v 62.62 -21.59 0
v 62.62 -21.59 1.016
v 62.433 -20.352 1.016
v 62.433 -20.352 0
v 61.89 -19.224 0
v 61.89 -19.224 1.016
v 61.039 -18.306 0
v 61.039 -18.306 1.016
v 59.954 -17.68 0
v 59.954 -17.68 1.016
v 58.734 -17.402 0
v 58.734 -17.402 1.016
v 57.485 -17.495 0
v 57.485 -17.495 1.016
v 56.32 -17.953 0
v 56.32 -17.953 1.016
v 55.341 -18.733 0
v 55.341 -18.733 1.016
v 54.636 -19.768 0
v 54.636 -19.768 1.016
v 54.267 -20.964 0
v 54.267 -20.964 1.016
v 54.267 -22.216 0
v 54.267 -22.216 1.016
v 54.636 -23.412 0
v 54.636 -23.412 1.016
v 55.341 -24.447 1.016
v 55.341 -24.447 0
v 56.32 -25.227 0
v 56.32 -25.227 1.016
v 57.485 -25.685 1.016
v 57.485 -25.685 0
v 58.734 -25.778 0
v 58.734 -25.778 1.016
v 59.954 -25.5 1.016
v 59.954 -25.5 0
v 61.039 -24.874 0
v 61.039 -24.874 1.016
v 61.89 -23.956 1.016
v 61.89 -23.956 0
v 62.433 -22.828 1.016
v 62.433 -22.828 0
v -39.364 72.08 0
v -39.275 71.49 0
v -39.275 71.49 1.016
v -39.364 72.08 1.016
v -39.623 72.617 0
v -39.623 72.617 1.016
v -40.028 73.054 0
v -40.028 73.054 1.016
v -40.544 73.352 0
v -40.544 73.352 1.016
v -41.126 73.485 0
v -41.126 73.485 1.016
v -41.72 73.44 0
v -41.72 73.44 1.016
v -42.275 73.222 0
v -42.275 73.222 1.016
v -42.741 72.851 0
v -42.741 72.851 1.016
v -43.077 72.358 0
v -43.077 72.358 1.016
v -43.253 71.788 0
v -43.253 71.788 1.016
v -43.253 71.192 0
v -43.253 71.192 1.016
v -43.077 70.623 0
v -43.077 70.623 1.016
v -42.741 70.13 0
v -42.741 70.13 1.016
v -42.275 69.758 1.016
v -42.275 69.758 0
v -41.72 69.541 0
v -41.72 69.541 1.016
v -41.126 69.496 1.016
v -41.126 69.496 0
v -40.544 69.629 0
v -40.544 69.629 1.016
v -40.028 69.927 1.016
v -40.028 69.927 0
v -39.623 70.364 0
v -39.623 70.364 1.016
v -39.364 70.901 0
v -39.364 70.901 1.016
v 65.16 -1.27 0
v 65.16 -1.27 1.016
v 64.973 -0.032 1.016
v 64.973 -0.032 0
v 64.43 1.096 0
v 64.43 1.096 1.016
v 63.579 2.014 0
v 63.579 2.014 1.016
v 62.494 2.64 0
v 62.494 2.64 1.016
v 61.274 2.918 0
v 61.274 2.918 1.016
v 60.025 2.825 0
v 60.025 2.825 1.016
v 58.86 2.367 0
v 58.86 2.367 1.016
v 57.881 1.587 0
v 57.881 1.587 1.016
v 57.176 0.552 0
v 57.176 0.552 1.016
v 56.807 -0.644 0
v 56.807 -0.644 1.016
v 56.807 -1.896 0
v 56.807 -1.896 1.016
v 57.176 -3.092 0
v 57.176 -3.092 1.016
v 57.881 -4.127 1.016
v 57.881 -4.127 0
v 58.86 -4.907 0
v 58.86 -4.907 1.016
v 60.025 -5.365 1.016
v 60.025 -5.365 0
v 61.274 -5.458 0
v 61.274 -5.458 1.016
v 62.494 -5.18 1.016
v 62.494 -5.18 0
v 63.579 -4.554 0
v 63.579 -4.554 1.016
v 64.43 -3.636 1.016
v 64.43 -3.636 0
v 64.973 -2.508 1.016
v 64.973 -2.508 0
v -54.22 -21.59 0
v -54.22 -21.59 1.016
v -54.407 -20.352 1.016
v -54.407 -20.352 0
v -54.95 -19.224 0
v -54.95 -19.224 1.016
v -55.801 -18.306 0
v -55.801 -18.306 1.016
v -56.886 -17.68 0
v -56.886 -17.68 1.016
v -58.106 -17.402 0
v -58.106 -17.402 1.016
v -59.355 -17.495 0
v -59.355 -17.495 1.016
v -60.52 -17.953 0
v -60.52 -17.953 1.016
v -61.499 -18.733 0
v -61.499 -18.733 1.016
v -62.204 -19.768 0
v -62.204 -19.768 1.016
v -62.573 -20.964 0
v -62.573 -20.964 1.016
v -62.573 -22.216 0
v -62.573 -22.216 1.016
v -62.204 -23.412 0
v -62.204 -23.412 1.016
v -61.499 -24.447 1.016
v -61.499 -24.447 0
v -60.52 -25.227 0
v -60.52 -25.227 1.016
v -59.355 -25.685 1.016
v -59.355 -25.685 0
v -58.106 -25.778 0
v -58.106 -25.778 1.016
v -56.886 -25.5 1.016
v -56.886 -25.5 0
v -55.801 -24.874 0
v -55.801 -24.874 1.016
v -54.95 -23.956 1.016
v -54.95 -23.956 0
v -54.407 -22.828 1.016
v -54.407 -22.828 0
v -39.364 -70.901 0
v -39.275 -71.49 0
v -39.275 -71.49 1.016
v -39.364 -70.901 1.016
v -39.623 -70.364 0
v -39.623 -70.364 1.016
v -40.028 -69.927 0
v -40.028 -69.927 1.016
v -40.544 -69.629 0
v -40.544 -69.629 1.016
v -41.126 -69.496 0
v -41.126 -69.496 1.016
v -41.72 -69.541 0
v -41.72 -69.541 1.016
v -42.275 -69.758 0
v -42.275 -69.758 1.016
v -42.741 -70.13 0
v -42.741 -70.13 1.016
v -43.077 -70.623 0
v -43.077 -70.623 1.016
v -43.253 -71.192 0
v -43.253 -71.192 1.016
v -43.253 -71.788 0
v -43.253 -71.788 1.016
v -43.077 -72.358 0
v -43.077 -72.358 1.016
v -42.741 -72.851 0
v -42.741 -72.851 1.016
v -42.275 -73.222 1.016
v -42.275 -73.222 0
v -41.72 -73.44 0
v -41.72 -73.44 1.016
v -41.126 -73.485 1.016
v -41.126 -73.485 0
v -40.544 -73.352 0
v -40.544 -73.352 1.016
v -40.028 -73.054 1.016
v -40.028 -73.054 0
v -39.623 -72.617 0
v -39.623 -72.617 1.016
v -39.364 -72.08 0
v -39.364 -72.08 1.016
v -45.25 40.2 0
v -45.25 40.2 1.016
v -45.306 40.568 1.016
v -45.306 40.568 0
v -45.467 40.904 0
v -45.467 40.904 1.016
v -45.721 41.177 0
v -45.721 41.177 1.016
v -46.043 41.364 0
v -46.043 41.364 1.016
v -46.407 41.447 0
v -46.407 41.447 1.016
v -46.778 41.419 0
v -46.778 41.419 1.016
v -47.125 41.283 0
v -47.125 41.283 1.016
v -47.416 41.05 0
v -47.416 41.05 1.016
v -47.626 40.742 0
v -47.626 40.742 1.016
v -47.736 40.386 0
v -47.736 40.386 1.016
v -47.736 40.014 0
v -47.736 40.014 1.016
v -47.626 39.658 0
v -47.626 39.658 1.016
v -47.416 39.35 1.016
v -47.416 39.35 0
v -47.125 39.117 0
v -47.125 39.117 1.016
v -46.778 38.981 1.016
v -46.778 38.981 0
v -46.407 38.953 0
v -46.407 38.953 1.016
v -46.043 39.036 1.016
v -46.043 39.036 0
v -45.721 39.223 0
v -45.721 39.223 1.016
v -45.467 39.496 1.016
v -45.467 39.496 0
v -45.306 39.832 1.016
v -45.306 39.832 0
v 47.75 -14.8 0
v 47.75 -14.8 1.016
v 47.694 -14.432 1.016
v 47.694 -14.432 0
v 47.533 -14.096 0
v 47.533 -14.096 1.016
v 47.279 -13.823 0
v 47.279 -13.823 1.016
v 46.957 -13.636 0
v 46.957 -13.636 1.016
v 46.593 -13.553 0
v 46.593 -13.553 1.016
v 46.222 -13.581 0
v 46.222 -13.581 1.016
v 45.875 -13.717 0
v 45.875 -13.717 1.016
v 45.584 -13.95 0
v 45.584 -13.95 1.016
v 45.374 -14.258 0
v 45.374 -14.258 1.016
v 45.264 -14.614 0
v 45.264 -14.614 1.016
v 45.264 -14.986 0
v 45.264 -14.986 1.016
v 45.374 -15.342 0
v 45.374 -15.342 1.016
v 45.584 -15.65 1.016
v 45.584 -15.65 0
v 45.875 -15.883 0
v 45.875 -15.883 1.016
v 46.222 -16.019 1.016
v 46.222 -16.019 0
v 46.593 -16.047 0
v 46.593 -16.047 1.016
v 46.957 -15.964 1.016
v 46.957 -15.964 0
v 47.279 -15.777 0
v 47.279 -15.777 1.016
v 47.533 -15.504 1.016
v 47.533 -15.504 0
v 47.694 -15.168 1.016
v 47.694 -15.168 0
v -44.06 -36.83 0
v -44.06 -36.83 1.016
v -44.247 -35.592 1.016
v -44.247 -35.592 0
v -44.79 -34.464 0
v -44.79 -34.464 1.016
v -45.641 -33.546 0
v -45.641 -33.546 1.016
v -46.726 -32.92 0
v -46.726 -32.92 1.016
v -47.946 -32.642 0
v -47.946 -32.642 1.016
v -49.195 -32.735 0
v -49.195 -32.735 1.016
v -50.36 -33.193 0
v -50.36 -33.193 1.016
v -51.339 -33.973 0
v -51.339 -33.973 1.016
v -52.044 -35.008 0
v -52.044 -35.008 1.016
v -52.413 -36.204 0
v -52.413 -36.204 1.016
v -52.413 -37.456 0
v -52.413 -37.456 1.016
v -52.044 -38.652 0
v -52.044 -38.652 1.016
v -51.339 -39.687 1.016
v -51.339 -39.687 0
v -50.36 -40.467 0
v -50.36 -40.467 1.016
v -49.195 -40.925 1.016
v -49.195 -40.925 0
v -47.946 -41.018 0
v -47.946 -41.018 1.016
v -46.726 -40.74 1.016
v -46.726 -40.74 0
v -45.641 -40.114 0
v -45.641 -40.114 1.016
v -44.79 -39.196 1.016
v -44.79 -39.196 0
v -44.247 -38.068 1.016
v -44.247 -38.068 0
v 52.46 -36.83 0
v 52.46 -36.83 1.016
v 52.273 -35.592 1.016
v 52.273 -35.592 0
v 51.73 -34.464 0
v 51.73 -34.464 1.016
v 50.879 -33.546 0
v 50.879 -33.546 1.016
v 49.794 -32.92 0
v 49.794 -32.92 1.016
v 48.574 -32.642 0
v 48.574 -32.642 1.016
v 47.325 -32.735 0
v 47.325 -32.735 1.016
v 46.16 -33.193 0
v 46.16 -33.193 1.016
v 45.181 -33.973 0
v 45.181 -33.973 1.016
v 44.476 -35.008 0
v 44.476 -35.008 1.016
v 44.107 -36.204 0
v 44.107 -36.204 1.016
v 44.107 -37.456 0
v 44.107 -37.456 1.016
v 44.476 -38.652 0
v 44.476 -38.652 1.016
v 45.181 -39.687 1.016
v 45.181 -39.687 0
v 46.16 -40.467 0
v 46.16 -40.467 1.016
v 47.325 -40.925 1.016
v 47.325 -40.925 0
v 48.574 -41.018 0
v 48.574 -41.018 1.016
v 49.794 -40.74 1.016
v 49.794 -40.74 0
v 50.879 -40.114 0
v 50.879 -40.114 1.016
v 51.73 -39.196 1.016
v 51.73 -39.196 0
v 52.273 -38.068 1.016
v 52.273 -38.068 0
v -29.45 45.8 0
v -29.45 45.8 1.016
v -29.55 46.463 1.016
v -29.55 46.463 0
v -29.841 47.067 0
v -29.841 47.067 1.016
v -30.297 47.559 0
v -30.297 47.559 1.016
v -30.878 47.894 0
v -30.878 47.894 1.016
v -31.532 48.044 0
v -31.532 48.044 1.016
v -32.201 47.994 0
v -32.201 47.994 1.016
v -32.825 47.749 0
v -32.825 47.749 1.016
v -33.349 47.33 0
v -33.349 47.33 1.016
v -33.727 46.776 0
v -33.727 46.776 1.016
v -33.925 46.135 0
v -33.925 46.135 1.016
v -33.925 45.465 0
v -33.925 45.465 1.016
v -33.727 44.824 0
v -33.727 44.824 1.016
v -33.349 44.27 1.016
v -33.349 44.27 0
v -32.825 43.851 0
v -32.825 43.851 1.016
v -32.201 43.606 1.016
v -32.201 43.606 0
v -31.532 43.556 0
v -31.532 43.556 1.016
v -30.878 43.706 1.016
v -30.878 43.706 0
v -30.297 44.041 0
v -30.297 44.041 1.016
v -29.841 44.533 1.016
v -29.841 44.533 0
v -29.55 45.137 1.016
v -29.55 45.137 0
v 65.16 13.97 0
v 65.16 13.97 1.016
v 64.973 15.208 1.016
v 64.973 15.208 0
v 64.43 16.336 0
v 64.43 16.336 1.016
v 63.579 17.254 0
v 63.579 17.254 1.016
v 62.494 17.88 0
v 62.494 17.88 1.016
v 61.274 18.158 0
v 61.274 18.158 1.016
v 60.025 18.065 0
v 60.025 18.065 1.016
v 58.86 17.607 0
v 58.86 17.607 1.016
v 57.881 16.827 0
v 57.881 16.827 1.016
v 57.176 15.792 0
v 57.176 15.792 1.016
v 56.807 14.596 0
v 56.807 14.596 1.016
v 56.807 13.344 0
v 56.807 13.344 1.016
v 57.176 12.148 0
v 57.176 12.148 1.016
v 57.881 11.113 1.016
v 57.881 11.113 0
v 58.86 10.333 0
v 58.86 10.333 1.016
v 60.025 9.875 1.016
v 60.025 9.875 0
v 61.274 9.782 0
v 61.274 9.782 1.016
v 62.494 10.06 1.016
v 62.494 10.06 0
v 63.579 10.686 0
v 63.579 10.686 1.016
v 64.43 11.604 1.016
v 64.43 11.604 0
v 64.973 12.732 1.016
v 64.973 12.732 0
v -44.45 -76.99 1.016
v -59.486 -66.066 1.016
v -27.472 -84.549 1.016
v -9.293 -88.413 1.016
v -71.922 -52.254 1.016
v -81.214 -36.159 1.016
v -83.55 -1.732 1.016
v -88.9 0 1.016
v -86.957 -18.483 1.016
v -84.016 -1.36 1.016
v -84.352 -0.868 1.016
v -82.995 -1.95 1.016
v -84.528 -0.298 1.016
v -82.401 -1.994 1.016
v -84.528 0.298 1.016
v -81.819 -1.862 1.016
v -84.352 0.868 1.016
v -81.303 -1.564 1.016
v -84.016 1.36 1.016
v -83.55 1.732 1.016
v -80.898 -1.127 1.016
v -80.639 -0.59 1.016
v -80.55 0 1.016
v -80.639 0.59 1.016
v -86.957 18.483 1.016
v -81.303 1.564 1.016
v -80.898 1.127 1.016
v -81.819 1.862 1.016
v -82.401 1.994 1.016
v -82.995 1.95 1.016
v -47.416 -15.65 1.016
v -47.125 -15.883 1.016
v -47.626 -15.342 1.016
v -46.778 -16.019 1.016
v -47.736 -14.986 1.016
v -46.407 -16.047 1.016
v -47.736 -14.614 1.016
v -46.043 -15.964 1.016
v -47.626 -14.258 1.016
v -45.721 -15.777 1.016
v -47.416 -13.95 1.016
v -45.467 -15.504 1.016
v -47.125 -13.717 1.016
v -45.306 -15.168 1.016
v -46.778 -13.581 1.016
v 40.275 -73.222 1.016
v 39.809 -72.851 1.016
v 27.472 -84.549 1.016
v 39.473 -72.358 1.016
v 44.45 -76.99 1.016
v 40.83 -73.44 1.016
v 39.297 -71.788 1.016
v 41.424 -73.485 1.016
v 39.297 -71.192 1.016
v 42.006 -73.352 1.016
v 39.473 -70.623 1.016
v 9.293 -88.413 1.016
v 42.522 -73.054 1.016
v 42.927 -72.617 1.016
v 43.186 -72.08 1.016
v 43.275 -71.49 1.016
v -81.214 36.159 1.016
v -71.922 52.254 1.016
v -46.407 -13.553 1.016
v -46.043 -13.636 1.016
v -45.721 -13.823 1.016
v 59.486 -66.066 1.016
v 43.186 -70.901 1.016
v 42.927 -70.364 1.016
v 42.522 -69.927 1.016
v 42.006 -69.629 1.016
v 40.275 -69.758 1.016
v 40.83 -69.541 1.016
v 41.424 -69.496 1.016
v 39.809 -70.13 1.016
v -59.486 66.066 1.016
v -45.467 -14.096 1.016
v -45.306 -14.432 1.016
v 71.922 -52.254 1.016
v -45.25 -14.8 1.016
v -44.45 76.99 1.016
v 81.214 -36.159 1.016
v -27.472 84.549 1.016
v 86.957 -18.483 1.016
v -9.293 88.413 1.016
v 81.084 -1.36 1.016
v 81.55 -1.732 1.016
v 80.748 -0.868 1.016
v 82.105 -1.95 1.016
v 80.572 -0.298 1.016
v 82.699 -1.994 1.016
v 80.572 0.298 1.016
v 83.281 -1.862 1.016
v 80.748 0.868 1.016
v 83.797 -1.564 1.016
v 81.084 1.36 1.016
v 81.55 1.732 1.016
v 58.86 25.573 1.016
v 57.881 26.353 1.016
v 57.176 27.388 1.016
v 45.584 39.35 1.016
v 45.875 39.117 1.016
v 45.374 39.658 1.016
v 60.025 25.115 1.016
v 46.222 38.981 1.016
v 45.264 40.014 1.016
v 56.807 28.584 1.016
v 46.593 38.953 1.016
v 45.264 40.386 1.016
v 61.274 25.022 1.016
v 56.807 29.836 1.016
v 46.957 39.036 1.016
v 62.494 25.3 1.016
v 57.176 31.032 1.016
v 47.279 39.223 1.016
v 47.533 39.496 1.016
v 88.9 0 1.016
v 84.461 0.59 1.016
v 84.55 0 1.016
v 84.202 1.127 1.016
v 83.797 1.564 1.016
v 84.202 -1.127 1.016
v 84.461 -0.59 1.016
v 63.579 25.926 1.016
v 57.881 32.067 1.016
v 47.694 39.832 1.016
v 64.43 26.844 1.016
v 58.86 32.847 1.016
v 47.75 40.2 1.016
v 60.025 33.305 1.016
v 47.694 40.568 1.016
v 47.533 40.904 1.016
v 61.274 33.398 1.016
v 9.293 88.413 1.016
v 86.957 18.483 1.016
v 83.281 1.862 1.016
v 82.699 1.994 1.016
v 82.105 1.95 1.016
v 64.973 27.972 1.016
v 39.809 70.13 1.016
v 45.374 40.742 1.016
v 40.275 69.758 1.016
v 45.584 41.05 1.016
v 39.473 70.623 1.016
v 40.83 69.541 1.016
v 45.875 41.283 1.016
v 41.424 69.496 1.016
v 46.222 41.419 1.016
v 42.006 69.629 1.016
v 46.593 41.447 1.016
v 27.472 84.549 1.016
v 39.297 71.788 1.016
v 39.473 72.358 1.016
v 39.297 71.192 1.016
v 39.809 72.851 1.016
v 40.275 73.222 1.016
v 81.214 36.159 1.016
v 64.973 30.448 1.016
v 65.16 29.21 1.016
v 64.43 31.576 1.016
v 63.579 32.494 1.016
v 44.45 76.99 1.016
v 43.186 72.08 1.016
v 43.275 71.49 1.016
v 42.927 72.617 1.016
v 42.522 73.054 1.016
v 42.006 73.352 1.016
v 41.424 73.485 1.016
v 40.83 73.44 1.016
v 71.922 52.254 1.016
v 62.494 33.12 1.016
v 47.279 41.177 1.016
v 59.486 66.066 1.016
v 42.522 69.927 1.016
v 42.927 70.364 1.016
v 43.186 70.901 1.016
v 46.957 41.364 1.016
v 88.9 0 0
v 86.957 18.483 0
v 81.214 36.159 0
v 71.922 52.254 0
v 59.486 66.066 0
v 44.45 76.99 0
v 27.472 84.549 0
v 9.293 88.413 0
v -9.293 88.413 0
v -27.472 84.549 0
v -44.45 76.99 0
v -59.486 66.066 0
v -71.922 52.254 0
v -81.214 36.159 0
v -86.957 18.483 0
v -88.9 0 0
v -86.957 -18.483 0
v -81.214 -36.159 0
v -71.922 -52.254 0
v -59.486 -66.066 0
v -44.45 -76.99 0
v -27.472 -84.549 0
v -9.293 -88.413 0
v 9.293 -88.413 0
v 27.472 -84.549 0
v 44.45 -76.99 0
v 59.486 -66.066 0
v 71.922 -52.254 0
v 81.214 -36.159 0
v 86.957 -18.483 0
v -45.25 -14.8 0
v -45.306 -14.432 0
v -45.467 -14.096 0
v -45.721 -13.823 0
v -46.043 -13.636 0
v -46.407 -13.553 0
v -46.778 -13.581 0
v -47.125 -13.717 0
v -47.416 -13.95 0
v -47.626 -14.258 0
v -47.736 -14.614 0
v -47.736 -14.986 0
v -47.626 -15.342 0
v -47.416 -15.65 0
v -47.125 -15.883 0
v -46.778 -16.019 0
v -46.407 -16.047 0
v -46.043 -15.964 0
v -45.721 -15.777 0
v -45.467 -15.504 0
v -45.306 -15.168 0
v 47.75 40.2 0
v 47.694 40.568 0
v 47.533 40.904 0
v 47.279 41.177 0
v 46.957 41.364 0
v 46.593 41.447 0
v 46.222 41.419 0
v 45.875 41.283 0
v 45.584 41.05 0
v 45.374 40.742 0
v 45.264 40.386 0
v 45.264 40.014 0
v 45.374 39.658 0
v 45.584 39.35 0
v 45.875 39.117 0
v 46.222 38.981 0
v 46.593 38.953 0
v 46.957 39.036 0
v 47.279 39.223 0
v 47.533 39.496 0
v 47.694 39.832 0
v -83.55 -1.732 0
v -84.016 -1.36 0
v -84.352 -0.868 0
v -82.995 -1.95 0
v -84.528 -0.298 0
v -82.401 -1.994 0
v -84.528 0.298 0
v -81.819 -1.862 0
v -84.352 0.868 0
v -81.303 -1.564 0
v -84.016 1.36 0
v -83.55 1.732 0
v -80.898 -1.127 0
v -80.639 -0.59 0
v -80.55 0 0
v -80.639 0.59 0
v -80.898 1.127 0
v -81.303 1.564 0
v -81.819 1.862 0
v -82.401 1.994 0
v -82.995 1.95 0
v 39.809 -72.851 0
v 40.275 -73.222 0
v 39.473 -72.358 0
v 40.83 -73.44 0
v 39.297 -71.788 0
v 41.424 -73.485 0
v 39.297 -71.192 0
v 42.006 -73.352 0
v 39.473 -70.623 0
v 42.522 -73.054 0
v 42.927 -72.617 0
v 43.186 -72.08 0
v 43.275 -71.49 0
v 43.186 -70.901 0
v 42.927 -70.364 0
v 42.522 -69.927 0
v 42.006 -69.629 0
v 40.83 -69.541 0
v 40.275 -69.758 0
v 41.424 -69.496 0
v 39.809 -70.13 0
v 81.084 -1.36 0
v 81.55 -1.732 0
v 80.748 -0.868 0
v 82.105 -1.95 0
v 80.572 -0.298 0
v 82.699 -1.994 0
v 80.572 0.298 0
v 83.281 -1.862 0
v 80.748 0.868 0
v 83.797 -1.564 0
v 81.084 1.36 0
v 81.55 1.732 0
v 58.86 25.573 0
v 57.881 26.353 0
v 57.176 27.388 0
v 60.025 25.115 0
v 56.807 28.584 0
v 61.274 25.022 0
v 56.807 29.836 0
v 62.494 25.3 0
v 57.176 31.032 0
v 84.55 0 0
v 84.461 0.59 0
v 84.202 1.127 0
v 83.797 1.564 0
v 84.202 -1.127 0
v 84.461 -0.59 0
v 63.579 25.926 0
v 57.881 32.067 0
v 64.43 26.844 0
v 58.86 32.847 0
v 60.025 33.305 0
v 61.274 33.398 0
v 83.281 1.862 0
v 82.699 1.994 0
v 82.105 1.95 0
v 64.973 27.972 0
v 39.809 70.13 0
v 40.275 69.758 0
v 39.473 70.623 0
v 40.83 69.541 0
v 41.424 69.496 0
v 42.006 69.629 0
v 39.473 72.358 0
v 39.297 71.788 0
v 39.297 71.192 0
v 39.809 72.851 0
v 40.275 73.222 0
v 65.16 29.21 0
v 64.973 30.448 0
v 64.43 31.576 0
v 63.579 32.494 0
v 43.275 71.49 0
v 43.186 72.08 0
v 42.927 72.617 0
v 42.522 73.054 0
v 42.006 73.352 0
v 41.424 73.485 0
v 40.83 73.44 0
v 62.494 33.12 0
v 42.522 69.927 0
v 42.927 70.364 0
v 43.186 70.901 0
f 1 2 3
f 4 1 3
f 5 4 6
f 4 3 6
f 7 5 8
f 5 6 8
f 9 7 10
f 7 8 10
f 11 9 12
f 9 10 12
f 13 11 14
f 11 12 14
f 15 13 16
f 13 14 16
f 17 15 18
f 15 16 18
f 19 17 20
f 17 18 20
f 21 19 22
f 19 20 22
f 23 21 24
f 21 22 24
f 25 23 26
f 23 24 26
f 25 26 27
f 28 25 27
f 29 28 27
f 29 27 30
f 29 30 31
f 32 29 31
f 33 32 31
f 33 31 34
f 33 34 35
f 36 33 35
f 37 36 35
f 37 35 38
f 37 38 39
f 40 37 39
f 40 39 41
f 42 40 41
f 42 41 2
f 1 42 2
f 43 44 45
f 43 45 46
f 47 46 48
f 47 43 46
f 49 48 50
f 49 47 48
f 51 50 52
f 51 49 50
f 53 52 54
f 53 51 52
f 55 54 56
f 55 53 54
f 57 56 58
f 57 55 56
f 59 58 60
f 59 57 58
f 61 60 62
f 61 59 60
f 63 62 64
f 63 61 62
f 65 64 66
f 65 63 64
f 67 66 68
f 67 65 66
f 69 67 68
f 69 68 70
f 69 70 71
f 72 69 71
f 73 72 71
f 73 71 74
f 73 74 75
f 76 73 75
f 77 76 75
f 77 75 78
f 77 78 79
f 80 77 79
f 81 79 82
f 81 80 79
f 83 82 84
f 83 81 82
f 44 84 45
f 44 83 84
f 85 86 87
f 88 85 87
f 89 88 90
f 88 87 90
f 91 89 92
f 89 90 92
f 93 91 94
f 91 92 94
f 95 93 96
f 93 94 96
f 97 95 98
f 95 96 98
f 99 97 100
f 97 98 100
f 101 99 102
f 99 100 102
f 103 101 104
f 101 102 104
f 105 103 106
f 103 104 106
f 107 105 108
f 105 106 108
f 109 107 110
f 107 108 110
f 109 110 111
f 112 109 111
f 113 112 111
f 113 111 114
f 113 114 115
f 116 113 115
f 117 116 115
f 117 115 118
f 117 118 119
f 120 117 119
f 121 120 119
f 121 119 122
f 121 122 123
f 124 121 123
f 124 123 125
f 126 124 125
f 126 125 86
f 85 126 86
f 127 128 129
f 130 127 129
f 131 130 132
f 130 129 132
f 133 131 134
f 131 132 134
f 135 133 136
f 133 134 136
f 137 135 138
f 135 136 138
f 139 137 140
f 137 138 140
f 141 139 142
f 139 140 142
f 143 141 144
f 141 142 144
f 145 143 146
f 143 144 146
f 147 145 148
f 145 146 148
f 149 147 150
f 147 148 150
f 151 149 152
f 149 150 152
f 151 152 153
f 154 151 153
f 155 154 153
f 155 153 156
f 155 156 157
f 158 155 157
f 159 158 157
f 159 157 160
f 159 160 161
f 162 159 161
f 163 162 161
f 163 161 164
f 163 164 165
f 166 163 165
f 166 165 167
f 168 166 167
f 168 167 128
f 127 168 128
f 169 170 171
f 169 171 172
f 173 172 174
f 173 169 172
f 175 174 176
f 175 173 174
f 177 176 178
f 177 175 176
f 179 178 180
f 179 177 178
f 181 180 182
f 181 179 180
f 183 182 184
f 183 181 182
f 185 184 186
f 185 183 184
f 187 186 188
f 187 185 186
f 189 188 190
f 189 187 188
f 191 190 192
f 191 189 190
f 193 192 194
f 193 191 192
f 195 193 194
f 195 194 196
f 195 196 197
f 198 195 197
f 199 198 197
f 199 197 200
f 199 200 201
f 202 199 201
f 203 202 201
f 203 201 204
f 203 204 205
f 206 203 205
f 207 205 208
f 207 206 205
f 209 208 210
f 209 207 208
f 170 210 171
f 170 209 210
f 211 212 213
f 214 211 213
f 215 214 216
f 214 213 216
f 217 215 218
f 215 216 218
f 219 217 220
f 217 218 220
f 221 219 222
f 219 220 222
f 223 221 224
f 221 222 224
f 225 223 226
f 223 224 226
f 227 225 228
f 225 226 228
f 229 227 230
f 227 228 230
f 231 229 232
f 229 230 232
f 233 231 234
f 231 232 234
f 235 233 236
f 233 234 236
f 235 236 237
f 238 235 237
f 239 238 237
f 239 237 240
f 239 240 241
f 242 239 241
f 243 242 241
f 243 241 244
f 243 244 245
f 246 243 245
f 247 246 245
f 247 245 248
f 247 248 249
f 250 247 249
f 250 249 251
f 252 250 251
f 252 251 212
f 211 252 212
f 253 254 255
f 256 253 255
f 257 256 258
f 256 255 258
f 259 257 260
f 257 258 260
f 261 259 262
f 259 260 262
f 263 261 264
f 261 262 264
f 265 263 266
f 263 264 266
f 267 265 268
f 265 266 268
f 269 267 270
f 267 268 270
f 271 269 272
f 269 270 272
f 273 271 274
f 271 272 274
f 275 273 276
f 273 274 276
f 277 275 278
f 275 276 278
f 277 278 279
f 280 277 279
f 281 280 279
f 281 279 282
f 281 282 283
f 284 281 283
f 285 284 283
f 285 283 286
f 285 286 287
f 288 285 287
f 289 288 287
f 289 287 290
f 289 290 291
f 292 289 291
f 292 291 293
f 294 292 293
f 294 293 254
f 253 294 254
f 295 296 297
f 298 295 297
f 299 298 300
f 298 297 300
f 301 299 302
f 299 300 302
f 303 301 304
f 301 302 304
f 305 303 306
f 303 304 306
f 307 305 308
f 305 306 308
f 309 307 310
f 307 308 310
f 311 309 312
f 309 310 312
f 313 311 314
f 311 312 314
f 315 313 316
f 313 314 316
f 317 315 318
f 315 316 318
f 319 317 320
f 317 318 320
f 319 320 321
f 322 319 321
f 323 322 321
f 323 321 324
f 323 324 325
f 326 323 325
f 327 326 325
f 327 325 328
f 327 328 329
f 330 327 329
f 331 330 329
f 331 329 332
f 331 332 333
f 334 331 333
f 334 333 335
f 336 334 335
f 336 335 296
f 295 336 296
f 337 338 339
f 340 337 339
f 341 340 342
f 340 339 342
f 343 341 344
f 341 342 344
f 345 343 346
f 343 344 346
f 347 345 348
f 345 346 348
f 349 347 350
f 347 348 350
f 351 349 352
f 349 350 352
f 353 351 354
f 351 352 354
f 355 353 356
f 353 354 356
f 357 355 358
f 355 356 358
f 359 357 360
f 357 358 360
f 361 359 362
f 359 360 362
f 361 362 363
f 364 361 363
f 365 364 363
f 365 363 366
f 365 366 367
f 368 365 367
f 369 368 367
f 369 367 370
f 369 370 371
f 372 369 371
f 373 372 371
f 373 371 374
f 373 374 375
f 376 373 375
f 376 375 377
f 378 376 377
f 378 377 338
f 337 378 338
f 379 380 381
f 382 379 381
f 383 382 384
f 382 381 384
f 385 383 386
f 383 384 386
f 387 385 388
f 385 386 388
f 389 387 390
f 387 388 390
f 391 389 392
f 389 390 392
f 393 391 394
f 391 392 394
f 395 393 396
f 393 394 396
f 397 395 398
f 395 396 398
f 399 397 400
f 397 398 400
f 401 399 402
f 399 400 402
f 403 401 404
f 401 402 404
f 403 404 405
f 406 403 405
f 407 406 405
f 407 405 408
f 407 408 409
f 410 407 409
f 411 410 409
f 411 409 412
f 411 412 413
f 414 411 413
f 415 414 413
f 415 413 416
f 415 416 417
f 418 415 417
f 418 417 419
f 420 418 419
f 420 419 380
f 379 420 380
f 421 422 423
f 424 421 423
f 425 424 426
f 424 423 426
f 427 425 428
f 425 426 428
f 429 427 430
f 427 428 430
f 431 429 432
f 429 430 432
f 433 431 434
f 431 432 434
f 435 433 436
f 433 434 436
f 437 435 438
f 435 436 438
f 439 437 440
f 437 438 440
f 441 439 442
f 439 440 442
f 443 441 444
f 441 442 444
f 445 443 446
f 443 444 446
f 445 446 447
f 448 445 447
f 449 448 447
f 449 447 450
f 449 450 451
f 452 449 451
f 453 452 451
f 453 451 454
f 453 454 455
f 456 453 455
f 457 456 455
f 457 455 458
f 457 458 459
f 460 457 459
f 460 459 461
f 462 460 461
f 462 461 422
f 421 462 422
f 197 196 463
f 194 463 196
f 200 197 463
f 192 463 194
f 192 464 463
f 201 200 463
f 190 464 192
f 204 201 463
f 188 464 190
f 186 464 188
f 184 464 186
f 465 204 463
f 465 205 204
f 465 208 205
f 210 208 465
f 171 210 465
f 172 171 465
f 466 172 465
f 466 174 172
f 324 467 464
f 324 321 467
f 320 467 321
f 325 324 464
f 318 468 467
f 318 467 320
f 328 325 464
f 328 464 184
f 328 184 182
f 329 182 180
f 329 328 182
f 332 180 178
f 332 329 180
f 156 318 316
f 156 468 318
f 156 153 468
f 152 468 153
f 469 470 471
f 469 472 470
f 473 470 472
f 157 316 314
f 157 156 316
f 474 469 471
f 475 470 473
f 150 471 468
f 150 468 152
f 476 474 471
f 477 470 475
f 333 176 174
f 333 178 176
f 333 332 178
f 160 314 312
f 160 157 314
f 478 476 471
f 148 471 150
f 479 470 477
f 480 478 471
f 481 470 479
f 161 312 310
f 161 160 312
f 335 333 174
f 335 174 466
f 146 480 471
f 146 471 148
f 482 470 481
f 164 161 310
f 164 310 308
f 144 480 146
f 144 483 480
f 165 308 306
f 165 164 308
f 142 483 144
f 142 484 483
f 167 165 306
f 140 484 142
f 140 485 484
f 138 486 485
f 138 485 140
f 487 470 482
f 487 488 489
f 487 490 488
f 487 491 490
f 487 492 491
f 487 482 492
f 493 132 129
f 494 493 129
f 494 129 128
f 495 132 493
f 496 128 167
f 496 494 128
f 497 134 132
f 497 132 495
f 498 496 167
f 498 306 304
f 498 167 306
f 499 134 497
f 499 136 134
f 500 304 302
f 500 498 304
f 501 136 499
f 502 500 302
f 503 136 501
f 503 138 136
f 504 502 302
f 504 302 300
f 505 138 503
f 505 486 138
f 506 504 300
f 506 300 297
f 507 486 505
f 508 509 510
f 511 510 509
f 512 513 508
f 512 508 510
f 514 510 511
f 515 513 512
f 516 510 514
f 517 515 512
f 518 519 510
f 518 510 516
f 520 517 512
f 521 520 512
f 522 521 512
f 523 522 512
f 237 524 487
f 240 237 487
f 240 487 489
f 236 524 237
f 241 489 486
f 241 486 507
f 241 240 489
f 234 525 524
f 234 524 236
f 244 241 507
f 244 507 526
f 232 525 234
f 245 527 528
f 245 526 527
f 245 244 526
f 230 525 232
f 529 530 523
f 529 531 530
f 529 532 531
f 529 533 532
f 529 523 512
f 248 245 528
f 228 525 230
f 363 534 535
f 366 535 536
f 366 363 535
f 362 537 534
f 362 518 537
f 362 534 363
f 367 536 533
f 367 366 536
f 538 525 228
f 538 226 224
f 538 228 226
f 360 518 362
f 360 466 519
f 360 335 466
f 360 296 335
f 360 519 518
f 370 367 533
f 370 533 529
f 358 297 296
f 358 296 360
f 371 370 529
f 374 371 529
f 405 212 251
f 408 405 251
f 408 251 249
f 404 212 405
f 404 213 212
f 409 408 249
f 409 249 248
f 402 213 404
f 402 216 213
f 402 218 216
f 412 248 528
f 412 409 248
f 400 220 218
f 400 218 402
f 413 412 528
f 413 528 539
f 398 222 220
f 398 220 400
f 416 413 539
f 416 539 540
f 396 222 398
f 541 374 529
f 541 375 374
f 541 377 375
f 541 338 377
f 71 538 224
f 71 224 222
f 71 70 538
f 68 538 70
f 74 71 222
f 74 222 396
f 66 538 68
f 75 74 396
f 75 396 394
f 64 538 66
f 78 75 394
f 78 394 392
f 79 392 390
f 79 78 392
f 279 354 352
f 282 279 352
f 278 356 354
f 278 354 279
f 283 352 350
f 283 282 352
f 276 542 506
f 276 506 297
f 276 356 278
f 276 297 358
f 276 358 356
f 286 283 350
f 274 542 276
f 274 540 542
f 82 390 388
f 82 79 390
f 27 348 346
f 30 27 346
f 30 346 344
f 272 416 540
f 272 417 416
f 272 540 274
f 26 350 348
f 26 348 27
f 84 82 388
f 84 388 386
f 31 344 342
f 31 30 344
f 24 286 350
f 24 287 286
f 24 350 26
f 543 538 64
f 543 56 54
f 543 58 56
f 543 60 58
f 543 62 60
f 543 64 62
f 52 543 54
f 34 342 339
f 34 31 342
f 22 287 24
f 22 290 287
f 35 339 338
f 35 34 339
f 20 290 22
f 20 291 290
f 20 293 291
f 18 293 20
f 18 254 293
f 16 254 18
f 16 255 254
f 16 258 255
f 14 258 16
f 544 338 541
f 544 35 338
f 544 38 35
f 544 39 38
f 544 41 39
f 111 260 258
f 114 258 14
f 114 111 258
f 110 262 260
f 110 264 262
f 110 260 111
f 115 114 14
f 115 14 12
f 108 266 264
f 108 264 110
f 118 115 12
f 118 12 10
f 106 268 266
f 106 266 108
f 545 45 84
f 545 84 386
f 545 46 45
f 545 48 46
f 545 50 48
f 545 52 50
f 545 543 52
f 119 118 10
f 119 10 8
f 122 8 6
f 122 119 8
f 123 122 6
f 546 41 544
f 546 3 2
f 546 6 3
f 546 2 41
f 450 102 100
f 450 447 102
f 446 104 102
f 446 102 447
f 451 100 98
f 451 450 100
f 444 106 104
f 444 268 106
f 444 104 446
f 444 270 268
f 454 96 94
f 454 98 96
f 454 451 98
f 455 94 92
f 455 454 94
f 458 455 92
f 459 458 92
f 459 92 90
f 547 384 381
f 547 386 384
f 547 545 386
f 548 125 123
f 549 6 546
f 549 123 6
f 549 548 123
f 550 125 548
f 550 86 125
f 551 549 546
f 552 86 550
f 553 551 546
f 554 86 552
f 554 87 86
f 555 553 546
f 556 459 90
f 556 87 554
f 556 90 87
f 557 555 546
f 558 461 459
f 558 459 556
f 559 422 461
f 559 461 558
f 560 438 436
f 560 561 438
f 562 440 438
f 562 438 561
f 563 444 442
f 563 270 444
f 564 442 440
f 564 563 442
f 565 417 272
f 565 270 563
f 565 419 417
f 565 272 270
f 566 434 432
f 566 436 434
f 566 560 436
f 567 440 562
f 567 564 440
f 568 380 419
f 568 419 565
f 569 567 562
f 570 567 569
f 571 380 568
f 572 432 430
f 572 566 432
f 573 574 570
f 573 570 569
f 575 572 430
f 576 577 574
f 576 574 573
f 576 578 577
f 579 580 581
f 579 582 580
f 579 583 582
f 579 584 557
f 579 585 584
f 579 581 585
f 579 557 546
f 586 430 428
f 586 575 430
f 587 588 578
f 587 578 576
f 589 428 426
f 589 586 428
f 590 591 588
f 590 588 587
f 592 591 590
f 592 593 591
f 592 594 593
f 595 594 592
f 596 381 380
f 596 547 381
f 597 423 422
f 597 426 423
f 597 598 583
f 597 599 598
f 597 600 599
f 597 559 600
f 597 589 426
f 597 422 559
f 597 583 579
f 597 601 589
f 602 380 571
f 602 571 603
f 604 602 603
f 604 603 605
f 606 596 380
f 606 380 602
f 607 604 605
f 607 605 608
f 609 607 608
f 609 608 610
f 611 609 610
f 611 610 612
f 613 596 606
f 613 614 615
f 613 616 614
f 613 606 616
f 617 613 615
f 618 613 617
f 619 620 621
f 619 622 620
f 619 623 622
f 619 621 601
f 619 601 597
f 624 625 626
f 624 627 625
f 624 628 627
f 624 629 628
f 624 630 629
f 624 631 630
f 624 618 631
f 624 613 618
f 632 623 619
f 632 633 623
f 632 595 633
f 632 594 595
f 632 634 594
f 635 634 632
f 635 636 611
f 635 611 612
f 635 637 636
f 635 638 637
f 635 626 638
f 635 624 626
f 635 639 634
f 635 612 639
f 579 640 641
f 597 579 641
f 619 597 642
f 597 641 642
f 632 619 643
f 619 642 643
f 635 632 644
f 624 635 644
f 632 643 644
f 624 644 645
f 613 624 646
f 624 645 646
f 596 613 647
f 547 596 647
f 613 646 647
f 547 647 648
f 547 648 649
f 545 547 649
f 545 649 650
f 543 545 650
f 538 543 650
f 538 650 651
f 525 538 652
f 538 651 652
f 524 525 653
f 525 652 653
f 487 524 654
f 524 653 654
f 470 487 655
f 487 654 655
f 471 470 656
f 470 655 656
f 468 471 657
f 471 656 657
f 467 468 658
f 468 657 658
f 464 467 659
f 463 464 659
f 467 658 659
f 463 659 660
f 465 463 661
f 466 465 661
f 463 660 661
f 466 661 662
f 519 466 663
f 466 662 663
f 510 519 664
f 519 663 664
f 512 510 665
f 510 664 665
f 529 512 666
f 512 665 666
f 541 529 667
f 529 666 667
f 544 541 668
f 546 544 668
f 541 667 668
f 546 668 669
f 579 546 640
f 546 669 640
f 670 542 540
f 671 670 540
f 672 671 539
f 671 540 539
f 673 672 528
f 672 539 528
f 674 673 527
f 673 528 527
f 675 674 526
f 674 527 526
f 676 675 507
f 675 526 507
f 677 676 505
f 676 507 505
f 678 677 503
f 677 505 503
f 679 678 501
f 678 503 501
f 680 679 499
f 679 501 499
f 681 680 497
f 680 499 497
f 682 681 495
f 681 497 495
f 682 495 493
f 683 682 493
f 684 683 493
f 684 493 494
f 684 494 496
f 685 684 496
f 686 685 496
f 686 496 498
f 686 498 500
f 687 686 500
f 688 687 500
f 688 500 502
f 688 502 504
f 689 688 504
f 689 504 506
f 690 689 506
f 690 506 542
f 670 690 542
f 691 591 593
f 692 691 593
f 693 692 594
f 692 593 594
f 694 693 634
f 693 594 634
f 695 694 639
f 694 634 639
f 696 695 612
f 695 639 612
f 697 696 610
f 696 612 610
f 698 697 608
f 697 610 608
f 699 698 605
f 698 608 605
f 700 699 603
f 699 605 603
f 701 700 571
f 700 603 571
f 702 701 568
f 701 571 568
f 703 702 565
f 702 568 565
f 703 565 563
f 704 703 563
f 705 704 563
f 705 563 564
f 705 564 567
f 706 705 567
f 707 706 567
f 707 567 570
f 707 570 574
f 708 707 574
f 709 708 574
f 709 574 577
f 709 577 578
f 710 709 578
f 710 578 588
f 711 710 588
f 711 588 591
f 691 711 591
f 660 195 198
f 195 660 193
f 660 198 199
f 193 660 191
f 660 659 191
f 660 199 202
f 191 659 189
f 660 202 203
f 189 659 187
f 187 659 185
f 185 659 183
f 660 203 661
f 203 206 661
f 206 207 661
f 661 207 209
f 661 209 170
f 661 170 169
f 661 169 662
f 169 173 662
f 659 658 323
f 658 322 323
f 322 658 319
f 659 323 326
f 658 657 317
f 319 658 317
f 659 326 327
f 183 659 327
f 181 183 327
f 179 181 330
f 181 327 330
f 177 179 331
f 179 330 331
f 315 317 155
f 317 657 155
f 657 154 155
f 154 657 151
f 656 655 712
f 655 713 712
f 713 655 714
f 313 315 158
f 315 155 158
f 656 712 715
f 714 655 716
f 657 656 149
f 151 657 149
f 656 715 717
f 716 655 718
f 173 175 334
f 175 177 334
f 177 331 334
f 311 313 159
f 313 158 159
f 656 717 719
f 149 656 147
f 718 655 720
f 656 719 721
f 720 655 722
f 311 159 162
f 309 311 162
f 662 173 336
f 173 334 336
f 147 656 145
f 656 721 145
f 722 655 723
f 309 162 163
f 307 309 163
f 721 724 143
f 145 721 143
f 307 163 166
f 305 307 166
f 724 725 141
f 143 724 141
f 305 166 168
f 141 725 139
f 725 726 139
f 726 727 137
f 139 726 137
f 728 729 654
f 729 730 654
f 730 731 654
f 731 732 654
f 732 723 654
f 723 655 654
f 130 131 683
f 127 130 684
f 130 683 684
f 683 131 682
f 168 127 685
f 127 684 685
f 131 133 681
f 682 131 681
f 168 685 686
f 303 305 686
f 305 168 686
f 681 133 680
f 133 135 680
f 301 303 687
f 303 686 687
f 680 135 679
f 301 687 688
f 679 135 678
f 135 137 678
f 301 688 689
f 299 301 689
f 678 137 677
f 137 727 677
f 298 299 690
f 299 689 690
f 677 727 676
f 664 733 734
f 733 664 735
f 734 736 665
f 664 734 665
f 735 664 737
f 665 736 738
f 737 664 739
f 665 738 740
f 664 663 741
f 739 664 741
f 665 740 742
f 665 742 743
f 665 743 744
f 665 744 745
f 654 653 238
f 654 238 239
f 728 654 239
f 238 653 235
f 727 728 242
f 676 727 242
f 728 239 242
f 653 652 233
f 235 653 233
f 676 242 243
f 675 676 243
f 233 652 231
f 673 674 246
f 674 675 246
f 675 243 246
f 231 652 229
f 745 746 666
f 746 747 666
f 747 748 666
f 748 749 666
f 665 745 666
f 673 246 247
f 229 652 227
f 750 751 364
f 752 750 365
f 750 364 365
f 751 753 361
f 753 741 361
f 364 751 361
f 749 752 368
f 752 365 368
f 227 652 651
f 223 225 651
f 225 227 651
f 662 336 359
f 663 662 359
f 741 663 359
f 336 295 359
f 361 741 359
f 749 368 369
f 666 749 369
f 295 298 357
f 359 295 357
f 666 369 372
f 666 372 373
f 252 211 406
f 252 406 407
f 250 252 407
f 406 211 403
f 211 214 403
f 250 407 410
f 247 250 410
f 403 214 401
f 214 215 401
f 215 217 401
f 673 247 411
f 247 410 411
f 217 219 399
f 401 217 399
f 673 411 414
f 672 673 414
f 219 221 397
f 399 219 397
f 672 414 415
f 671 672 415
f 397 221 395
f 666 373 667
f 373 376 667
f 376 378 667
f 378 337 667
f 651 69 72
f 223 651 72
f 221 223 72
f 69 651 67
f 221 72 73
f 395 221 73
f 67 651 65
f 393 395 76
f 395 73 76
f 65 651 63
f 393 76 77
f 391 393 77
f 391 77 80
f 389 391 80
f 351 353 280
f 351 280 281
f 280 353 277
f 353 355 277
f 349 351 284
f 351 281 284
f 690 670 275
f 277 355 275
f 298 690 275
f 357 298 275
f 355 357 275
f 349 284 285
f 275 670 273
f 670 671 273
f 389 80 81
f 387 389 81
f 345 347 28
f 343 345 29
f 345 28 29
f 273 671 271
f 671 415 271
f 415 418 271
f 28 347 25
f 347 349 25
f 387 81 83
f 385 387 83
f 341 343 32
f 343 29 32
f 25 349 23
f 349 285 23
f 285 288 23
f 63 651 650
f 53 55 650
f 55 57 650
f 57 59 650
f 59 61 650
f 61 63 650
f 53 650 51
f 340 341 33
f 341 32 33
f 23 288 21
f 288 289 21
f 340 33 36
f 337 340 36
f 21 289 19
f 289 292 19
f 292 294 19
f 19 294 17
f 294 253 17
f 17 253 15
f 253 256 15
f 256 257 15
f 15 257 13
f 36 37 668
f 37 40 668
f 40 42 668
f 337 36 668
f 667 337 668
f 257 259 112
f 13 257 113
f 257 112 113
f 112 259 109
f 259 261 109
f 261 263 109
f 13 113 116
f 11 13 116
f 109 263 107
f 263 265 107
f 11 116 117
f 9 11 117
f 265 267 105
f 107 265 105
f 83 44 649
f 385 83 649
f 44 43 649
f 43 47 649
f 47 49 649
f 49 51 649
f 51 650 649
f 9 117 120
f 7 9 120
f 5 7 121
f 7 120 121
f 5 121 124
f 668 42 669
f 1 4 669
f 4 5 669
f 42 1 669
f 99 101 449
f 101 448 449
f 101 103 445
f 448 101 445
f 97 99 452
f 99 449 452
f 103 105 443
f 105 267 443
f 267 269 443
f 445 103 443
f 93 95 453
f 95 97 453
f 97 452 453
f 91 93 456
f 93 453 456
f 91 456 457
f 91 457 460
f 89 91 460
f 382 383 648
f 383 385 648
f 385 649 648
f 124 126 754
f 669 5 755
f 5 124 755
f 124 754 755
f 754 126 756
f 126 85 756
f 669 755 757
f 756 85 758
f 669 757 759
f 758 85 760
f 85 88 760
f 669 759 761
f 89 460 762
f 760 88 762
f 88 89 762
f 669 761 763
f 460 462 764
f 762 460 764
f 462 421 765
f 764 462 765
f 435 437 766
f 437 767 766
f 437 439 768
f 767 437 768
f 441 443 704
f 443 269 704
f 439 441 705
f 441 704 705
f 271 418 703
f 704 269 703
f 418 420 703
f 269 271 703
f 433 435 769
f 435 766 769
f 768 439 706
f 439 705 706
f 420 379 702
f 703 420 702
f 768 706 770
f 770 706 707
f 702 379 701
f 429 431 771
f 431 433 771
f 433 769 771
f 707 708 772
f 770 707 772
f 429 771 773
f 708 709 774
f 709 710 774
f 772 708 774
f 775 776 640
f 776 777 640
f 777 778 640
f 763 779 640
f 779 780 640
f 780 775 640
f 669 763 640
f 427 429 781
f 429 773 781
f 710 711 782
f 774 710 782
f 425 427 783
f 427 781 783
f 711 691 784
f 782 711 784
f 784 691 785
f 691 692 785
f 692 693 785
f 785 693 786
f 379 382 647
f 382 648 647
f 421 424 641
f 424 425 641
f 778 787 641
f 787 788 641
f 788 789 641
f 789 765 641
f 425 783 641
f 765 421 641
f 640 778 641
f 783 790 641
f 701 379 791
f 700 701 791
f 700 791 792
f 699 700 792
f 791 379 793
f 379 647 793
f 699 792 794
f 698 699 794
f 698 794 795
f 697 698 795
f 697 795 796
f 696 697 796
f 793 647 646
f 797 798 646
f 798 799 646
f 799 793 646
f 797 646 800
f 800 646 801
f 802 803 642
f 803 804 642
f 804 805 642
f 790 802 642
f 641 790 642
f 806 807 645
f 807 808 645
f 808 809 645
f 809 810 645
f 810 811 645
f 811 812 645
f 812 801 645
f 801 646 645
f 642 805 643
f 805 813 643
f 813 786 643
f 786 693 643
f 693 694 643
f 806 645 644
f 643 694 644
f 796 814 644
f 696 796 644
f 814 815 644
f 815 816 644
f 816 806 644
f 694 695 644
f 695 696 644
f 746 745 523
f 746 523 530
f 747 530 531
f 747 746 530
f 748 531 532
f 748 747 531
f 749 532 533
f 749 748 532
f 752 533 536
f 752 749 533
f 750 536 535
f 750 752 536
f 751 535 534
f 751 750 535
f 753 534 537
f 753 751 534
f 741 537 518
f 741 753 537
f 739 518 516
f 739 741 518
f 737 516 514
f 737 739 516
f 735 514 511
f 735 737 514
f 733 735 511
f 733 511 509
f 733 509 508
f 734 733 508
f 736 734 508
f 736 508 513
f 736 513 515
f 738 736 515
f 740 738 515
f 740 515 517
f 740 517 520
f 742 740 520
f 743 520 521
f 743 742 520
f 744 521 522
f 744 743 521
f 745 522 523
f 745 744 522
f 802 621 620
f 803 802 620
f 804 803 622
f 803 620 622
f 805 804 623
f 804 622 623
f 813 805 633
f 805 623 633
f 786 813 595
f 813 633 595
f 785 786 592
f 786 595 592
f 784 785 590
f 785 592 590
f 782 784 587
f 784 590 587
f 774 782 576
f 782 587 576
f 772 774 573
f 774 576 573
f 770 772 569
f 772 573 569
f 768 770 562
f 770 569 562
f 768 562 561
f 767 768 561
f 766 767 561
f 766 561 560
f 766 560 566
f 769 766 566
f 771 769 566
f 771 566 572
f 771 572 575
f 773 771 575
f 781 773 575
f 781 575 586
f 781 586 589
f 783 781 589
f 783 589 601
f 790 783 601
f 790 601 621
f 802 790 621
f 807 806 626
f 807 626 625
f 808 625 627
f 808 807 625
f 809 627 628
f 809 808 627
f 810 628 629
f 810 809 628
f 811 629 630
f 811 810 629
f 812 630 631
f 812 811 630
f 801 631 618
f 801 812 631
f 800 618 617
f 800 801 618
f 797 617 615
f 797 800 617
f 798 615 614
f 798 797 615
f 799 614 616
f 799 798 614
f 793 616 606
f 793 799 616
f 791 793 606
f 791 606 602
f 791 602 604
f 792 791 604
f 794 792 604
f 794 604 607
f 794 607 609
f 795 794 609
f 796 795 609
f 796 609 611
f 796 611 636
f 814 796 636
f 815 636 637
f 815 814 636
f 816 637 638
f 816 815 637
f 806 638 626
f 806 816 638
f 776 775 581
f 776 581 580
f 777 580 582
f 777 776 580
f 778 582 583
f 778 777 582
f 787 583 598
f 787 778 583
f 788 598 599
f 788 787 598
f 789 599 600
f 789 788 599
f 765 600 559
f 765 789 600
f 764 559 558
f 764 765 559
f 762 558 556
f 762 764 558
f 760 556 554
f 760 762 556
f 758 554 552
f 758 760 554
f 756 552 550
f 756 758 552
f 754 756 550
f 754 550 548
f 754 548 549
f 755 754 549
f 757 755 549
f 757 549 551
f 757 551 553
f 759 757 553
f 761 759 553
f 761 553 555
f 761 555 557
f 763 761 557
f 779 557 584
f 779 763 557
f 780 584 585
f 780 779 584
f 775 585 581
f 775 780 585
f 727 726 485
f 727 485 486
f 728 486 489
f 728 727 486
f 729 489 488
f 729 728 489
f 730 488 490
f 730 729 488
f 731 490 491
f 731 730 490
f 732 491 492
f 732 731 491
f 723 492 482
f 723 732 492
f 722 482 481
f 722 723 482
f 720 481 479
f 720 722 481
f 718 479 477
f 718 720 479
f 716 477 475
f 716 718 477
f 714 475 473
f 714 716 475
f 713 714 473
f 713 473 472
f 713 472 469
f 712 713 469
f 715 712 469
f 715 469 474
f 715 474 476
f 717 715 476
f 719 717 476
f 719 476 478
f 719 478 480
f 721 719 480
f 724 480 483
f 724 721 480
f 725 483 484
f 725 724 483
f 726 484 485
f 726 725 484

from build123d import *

# Parameters (mm, degrees)
SKETCH1_R           = 88.9
SKETCH1_R_2         = 2
BOSS_EXTRUDE1_DEPTH = 1.016
SKETCH3_R           = 1.25
SKETCH3_R_2         = 2.25
CUT_EXTRUDE2_DEPTH  = 3.175
SKETCH4_R           = 4.2
CUT_EXTRUDE3_DEPTH  = 10


with BuildPart() as part:
    # Sketch1 → Boss-Extrude1 (new body)
    with BuildSketch(Plane.XY):
        Circle(SKETCH1_R)
        with Locations((41.275, 71.490397082)):
            Circle(SKETCH1_R_2, mode=Mode.SUBTRACT)
        with Locations((82.55, 0)):
            Circle(SKETCH1_R_2, mode=Mode.SUBTRACT)
        with Locations((41.275, -71.490397082)):
            Circle(SKETCH1_R_2, mode=Mode.SUBTRACT)
        with Locations((-41.275, -71.490397082)):
            Circle(SKETCH1_R_2, mode=Mode.SUBTRACT)
        with Locations((-82.55, 0)):
            Circle(SKETCH1_R_2, mode=Mode.SUBTRACT)
        with Locations((-41.275, 71.490397082)):
            Circle(SKETCH1_R_2, mode=Mode.SUBTRACT)
    extrude(amount=BOSS_EXTRUDE1_DEPTH)

    # Sketch3 → Cut-Extrude2 (cut)
    with BuildSketch(Plane.XY.offset(1.016)):
        with Locations((-46.5, 40.2)):
            Circle(SKETCH3_R)
        with Locations((46.5, 40.2)):
            Circle(SKETCH3_R)
        with Locations((46.5, -14.8)):
            Circle(SKETCH3_R)
        with Locations((-46.5, -14.8)):
            Circle(SKETCH3_R)
        with Locations((-31.700000009, 45.8)):
            Circle(SKETCH3_R_2)
    extrude(amount=-CUT_EXTRUDE2_DEPTH, mode=Mode.SUBTRACT)

    # Sketch4 → Cut-Extrude3 (cut)
    with BuildSketch(Plane.XY.offset(1.016)):
        with Locations((60.96, 29.21)):
            Circle(SKETCH4_R)
        with Locations((60.96, 13.97)):
            Circle(SKETCH4_R)
        with Locations((60.96, -1.27)):
            Circle(SKETCH4_R)
        with Locations((58.42, -21.59)):
            Circle(SKETCH4_R)
        with Locations((48.26, -36.83)):
            Circle(SKETCH4_R)
        with Locations((-58.42, -21.59)):
            Circle(SKETCH4_R)
        with Locations((-48.26, -36.83)):
            Circle(SKETCH4_R)
    extrude(amount=-CUT_EXTRUDE3_DEPTH, mode=Mode.SUBTRACT)


solid = part.part
